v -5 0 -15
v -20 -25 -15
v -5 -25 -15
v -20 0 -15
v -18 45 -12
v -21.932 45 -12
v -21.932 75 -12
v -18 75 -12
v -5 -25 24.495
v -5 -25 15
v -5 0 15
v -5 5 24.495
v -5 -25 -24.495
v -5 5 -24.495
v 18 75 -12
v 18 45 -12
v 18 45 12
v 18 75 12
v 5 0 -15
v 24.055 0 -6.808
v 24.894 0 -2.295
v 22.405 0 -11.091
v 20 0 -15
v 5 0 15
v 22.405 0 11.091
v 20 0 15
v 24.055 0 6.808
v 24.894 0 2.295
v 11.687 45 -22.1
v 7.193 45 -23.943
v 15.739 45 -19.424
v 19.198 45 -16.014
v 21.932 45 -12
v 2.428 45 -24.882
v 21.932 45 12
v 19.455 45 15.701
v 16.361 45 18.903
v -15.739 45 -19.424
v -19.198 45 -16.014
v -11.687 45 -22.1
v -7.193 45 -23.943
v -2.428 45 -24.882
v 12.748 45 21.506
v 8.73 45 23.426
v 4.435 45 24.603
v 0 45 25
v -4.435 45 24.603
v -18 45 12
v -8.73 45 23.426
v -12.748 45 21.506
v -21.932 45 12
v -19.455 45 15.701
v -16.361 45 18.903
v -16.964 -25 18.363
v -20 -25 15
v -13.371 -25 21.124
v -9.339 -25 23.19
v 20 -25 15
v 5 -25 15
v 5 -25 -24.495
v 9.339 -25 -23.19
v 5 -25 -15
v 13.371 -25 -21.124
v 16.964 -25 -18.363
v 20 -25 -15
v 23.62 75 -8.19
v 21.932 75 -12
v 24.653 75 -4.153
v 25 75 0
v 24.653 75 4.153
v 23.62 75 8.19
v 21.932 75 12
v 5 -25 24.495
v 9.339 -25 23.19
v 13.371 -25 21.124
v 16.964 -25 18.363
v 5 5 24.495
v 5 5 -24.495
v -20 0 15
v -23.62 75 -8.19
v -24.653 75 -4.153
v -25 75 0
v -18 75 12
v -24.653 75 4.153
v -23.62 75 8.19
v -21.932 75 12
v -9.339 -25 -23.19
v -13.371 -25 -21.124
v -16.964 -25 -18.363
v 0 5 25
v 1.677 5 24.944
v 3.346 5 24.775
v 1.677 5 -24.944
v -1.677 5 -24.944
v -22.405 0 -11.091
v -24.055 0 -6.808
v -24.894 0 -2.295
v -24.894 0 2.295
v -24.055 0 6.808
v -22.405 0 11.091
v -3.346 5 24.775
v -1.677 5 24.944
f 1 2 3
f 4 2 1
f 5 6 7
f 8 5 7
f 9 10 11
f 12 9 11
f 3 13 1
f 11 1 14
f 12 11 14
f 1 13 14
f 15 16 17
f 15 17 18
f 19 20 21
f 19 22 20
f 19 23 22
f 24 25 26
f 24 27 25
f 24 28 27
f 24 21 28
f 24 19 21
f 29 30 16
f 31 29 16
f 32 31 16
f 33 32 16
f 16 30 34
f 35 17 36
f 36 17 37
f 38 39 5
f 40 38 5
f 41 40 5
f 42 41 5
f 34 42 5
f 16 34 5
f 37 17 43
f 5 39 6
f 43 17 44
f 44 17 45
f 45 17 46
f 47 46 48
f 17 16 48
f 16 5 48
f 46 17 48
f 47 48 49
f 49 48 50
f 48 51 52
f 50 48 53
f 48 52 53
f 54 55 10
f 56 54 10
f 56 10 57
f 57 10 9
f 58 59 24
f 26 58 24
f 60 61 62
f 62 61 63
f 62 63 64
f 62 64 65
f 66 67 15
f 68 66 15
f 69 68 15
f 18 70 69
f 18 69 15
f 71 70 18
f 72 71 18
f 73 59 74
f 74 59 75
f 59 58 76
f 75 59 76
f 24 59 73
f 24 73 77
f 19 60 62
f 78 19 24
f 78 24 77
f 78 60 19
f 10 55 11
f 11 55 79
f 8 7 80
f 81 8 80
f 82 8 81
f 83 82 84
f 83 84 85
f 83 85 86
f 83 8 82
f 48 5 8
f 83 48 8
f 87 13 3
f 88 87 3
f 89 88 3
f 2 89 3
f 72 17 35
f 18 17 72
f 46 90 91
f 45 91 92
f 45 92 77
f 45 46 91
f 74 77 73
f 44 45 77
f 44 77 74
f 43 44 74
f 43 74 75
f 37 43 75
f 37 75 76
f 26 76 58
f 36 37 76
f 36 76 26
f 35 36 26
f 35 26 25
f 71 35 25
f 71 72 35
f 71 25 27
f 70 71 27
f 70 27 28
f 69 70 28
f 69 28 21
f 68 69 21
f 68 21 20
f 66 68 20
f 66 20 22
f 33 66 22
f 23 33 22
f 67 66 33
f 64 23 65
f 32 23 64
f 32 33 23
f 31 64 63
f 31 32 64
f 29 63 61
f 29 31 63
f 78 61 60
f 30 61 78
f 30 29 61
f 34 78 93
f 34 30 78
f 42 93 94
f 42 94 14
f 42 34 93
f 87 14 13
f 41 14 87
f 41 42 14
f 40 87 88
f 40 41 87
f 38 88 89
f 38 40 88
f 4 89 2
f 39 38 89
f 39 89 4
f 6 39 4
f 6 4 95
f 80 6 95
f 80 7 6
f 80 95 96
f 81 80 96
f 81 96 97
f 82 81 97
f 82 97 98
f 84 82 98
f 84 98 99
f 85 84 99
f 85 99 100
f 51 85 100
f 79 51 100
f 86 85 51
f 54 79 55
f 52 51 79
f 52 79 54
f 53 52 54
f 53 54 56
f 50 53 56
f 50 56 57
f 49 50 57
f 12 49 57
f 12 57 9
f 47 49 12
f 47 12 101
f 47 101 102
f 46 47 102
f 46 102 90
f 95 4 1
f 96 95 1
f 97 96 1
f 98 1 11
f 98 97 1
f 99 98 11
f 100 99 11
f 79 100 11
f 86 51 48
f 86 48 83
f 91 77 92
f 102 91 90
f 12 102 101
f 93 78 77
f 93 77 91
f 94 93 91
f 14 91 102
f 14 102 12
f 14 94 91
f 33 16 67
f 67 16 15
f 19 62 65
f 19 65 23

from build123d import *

# Parameters (mm, degrees)
SKETCH1_R               = 25
BOSS_EXTRUDE1_DEPTH     = 25
BOSS_EXTRUDE2_START     = 75
SKETCH1_2_R             = 25
BOSS_EXTRUDE2_DEPTH     = 75
CUT_EXTRUDE1_DEPTH      = 83.915619759
CUT_EXTRUDE1_DEPTH_BACK = 83.915619759
SKETCH2_W               = 25
SKETCH2_H               = 30
CUT_EXTRUDE2_DEPTH      = 83.915619759
CUT_EXTRUDE2_DEPTH_BACK = 83.915619759
SKETCH5_W               = 30
SKETCH5_H               = 13
CUT_EXTRUDE3_DEPTH      = 83.915619759
CUT_EXTRUDE3_DEPTH_BACK = 83.915619759
SKETCH6_W               = 30
SKETCH6_H               = 10
CUT_EXTRUDE4_DEPTH      = 83.915619759
CUT_EXTRUDE4_DEPTH_BACK = 83.915619759
SKETCH8_W               = 30
SKETCH8_H               = 36


with BuildPart() as part:
    # Sketch1 → Boss-Extrude1 (new body)
    with BuildSketch(Plane(origin=(0, 0, 0), x_dir=(-1, 0, 0), z_dir=(0, 1, 0))):
        Circle(SKETCH1_R)
    extrude(amount=-BOSS_EXTRUDE1_DEPTH)

    # Sketch1<2> → Boss-Extrude2 (add)
    with BuildSketch(Plane(origin=(0, 0, 0), x_dir=(-1, 0, 0), z_dir=(0, 1, 0)).offset(BOSS_EXTRUDE2_START)):
        Circle(SKETCH1_2_R)
    extrude(amount=-BOSS_EXTRUDE2_DEPTH)

    # Sketch2 → Cut-Extrude1 (cut, two sides: drawn at the far end of the back side and taken through both)
    with BuildSketch(Plane.YZ.offset(-CUT_EXTRUDE1_DEPTH_BACK)):
        with Locations((-12.5, 0)):
            Rectangle(SKETCH2_W, SKETCH2_H)
    extrude(amount=CUT_EXTRUDE1_DEPTH + CUT_EXTRUDE1_DEPTH_BACK, mode=Mode.SUBTRACT)

    # Sketch5 → Cut-Extrude2 (cut, two sides: drawn at the far end of the back side and taken through both)
    with BuildSketch(Plane.YZ.offset(-CUT_EXTRUDE2_DEPTH_BACK)):
        with Locations((60, 18.5)):
            Rectangle(SKETCH5_W, SKETCH5_H)
        with Locations((60, -18.5)):
            Rectangle(SKETCH5_W, SKETCH5_H)
    extrude(amount=CUT_EXTRUDE2_DEPTH + CUT_EXTRUDE2_DEPTH_BACK, mode=Mode.SUBTRACT)

    # Sketch6 → Cut-Extrude3 (cut, two sides: drawn at the far end of the back side and taken through both)
    with BuildSketch(Plane(origin=(0, 0, 0), x_dir=(0, 1, 0), z_dir=(0, 0, 1)).offset(-CUT_EXTRUDE3_DEPTH_BACK)):
        with Locations((-10, 0)):
            Rectangle(SKETCH6_W, SKETCH6_H)
    extrude(amount=CUT_EXTRUDE3_DEPTH + CUT_EXTRUDE3_DEPTH_BACK, mode=Mode.SUBTRACT)

    # Sketch8 → Cut-Extrude4 (cut, two sides: drawn at the far end of the back side and taken through both)
    with BuildSketch(Plane(origin=(0, 0, 0), x_dir=(0, 1, 0), z_dir=(0, 0, 1)).offset(-CUT_EXTRUDE4_DEPTH_BACK)):
        with Locations((60, 0)):
            Rectangle(SKETCH8_W, SKETCH8_H)
    extrude(amount=CUT_EXTRUDE4_DEPTH + CUT_EXTRUDE4_DEPTH_BACK, mode=Mode.SUBTRACT)


solid = part.part
